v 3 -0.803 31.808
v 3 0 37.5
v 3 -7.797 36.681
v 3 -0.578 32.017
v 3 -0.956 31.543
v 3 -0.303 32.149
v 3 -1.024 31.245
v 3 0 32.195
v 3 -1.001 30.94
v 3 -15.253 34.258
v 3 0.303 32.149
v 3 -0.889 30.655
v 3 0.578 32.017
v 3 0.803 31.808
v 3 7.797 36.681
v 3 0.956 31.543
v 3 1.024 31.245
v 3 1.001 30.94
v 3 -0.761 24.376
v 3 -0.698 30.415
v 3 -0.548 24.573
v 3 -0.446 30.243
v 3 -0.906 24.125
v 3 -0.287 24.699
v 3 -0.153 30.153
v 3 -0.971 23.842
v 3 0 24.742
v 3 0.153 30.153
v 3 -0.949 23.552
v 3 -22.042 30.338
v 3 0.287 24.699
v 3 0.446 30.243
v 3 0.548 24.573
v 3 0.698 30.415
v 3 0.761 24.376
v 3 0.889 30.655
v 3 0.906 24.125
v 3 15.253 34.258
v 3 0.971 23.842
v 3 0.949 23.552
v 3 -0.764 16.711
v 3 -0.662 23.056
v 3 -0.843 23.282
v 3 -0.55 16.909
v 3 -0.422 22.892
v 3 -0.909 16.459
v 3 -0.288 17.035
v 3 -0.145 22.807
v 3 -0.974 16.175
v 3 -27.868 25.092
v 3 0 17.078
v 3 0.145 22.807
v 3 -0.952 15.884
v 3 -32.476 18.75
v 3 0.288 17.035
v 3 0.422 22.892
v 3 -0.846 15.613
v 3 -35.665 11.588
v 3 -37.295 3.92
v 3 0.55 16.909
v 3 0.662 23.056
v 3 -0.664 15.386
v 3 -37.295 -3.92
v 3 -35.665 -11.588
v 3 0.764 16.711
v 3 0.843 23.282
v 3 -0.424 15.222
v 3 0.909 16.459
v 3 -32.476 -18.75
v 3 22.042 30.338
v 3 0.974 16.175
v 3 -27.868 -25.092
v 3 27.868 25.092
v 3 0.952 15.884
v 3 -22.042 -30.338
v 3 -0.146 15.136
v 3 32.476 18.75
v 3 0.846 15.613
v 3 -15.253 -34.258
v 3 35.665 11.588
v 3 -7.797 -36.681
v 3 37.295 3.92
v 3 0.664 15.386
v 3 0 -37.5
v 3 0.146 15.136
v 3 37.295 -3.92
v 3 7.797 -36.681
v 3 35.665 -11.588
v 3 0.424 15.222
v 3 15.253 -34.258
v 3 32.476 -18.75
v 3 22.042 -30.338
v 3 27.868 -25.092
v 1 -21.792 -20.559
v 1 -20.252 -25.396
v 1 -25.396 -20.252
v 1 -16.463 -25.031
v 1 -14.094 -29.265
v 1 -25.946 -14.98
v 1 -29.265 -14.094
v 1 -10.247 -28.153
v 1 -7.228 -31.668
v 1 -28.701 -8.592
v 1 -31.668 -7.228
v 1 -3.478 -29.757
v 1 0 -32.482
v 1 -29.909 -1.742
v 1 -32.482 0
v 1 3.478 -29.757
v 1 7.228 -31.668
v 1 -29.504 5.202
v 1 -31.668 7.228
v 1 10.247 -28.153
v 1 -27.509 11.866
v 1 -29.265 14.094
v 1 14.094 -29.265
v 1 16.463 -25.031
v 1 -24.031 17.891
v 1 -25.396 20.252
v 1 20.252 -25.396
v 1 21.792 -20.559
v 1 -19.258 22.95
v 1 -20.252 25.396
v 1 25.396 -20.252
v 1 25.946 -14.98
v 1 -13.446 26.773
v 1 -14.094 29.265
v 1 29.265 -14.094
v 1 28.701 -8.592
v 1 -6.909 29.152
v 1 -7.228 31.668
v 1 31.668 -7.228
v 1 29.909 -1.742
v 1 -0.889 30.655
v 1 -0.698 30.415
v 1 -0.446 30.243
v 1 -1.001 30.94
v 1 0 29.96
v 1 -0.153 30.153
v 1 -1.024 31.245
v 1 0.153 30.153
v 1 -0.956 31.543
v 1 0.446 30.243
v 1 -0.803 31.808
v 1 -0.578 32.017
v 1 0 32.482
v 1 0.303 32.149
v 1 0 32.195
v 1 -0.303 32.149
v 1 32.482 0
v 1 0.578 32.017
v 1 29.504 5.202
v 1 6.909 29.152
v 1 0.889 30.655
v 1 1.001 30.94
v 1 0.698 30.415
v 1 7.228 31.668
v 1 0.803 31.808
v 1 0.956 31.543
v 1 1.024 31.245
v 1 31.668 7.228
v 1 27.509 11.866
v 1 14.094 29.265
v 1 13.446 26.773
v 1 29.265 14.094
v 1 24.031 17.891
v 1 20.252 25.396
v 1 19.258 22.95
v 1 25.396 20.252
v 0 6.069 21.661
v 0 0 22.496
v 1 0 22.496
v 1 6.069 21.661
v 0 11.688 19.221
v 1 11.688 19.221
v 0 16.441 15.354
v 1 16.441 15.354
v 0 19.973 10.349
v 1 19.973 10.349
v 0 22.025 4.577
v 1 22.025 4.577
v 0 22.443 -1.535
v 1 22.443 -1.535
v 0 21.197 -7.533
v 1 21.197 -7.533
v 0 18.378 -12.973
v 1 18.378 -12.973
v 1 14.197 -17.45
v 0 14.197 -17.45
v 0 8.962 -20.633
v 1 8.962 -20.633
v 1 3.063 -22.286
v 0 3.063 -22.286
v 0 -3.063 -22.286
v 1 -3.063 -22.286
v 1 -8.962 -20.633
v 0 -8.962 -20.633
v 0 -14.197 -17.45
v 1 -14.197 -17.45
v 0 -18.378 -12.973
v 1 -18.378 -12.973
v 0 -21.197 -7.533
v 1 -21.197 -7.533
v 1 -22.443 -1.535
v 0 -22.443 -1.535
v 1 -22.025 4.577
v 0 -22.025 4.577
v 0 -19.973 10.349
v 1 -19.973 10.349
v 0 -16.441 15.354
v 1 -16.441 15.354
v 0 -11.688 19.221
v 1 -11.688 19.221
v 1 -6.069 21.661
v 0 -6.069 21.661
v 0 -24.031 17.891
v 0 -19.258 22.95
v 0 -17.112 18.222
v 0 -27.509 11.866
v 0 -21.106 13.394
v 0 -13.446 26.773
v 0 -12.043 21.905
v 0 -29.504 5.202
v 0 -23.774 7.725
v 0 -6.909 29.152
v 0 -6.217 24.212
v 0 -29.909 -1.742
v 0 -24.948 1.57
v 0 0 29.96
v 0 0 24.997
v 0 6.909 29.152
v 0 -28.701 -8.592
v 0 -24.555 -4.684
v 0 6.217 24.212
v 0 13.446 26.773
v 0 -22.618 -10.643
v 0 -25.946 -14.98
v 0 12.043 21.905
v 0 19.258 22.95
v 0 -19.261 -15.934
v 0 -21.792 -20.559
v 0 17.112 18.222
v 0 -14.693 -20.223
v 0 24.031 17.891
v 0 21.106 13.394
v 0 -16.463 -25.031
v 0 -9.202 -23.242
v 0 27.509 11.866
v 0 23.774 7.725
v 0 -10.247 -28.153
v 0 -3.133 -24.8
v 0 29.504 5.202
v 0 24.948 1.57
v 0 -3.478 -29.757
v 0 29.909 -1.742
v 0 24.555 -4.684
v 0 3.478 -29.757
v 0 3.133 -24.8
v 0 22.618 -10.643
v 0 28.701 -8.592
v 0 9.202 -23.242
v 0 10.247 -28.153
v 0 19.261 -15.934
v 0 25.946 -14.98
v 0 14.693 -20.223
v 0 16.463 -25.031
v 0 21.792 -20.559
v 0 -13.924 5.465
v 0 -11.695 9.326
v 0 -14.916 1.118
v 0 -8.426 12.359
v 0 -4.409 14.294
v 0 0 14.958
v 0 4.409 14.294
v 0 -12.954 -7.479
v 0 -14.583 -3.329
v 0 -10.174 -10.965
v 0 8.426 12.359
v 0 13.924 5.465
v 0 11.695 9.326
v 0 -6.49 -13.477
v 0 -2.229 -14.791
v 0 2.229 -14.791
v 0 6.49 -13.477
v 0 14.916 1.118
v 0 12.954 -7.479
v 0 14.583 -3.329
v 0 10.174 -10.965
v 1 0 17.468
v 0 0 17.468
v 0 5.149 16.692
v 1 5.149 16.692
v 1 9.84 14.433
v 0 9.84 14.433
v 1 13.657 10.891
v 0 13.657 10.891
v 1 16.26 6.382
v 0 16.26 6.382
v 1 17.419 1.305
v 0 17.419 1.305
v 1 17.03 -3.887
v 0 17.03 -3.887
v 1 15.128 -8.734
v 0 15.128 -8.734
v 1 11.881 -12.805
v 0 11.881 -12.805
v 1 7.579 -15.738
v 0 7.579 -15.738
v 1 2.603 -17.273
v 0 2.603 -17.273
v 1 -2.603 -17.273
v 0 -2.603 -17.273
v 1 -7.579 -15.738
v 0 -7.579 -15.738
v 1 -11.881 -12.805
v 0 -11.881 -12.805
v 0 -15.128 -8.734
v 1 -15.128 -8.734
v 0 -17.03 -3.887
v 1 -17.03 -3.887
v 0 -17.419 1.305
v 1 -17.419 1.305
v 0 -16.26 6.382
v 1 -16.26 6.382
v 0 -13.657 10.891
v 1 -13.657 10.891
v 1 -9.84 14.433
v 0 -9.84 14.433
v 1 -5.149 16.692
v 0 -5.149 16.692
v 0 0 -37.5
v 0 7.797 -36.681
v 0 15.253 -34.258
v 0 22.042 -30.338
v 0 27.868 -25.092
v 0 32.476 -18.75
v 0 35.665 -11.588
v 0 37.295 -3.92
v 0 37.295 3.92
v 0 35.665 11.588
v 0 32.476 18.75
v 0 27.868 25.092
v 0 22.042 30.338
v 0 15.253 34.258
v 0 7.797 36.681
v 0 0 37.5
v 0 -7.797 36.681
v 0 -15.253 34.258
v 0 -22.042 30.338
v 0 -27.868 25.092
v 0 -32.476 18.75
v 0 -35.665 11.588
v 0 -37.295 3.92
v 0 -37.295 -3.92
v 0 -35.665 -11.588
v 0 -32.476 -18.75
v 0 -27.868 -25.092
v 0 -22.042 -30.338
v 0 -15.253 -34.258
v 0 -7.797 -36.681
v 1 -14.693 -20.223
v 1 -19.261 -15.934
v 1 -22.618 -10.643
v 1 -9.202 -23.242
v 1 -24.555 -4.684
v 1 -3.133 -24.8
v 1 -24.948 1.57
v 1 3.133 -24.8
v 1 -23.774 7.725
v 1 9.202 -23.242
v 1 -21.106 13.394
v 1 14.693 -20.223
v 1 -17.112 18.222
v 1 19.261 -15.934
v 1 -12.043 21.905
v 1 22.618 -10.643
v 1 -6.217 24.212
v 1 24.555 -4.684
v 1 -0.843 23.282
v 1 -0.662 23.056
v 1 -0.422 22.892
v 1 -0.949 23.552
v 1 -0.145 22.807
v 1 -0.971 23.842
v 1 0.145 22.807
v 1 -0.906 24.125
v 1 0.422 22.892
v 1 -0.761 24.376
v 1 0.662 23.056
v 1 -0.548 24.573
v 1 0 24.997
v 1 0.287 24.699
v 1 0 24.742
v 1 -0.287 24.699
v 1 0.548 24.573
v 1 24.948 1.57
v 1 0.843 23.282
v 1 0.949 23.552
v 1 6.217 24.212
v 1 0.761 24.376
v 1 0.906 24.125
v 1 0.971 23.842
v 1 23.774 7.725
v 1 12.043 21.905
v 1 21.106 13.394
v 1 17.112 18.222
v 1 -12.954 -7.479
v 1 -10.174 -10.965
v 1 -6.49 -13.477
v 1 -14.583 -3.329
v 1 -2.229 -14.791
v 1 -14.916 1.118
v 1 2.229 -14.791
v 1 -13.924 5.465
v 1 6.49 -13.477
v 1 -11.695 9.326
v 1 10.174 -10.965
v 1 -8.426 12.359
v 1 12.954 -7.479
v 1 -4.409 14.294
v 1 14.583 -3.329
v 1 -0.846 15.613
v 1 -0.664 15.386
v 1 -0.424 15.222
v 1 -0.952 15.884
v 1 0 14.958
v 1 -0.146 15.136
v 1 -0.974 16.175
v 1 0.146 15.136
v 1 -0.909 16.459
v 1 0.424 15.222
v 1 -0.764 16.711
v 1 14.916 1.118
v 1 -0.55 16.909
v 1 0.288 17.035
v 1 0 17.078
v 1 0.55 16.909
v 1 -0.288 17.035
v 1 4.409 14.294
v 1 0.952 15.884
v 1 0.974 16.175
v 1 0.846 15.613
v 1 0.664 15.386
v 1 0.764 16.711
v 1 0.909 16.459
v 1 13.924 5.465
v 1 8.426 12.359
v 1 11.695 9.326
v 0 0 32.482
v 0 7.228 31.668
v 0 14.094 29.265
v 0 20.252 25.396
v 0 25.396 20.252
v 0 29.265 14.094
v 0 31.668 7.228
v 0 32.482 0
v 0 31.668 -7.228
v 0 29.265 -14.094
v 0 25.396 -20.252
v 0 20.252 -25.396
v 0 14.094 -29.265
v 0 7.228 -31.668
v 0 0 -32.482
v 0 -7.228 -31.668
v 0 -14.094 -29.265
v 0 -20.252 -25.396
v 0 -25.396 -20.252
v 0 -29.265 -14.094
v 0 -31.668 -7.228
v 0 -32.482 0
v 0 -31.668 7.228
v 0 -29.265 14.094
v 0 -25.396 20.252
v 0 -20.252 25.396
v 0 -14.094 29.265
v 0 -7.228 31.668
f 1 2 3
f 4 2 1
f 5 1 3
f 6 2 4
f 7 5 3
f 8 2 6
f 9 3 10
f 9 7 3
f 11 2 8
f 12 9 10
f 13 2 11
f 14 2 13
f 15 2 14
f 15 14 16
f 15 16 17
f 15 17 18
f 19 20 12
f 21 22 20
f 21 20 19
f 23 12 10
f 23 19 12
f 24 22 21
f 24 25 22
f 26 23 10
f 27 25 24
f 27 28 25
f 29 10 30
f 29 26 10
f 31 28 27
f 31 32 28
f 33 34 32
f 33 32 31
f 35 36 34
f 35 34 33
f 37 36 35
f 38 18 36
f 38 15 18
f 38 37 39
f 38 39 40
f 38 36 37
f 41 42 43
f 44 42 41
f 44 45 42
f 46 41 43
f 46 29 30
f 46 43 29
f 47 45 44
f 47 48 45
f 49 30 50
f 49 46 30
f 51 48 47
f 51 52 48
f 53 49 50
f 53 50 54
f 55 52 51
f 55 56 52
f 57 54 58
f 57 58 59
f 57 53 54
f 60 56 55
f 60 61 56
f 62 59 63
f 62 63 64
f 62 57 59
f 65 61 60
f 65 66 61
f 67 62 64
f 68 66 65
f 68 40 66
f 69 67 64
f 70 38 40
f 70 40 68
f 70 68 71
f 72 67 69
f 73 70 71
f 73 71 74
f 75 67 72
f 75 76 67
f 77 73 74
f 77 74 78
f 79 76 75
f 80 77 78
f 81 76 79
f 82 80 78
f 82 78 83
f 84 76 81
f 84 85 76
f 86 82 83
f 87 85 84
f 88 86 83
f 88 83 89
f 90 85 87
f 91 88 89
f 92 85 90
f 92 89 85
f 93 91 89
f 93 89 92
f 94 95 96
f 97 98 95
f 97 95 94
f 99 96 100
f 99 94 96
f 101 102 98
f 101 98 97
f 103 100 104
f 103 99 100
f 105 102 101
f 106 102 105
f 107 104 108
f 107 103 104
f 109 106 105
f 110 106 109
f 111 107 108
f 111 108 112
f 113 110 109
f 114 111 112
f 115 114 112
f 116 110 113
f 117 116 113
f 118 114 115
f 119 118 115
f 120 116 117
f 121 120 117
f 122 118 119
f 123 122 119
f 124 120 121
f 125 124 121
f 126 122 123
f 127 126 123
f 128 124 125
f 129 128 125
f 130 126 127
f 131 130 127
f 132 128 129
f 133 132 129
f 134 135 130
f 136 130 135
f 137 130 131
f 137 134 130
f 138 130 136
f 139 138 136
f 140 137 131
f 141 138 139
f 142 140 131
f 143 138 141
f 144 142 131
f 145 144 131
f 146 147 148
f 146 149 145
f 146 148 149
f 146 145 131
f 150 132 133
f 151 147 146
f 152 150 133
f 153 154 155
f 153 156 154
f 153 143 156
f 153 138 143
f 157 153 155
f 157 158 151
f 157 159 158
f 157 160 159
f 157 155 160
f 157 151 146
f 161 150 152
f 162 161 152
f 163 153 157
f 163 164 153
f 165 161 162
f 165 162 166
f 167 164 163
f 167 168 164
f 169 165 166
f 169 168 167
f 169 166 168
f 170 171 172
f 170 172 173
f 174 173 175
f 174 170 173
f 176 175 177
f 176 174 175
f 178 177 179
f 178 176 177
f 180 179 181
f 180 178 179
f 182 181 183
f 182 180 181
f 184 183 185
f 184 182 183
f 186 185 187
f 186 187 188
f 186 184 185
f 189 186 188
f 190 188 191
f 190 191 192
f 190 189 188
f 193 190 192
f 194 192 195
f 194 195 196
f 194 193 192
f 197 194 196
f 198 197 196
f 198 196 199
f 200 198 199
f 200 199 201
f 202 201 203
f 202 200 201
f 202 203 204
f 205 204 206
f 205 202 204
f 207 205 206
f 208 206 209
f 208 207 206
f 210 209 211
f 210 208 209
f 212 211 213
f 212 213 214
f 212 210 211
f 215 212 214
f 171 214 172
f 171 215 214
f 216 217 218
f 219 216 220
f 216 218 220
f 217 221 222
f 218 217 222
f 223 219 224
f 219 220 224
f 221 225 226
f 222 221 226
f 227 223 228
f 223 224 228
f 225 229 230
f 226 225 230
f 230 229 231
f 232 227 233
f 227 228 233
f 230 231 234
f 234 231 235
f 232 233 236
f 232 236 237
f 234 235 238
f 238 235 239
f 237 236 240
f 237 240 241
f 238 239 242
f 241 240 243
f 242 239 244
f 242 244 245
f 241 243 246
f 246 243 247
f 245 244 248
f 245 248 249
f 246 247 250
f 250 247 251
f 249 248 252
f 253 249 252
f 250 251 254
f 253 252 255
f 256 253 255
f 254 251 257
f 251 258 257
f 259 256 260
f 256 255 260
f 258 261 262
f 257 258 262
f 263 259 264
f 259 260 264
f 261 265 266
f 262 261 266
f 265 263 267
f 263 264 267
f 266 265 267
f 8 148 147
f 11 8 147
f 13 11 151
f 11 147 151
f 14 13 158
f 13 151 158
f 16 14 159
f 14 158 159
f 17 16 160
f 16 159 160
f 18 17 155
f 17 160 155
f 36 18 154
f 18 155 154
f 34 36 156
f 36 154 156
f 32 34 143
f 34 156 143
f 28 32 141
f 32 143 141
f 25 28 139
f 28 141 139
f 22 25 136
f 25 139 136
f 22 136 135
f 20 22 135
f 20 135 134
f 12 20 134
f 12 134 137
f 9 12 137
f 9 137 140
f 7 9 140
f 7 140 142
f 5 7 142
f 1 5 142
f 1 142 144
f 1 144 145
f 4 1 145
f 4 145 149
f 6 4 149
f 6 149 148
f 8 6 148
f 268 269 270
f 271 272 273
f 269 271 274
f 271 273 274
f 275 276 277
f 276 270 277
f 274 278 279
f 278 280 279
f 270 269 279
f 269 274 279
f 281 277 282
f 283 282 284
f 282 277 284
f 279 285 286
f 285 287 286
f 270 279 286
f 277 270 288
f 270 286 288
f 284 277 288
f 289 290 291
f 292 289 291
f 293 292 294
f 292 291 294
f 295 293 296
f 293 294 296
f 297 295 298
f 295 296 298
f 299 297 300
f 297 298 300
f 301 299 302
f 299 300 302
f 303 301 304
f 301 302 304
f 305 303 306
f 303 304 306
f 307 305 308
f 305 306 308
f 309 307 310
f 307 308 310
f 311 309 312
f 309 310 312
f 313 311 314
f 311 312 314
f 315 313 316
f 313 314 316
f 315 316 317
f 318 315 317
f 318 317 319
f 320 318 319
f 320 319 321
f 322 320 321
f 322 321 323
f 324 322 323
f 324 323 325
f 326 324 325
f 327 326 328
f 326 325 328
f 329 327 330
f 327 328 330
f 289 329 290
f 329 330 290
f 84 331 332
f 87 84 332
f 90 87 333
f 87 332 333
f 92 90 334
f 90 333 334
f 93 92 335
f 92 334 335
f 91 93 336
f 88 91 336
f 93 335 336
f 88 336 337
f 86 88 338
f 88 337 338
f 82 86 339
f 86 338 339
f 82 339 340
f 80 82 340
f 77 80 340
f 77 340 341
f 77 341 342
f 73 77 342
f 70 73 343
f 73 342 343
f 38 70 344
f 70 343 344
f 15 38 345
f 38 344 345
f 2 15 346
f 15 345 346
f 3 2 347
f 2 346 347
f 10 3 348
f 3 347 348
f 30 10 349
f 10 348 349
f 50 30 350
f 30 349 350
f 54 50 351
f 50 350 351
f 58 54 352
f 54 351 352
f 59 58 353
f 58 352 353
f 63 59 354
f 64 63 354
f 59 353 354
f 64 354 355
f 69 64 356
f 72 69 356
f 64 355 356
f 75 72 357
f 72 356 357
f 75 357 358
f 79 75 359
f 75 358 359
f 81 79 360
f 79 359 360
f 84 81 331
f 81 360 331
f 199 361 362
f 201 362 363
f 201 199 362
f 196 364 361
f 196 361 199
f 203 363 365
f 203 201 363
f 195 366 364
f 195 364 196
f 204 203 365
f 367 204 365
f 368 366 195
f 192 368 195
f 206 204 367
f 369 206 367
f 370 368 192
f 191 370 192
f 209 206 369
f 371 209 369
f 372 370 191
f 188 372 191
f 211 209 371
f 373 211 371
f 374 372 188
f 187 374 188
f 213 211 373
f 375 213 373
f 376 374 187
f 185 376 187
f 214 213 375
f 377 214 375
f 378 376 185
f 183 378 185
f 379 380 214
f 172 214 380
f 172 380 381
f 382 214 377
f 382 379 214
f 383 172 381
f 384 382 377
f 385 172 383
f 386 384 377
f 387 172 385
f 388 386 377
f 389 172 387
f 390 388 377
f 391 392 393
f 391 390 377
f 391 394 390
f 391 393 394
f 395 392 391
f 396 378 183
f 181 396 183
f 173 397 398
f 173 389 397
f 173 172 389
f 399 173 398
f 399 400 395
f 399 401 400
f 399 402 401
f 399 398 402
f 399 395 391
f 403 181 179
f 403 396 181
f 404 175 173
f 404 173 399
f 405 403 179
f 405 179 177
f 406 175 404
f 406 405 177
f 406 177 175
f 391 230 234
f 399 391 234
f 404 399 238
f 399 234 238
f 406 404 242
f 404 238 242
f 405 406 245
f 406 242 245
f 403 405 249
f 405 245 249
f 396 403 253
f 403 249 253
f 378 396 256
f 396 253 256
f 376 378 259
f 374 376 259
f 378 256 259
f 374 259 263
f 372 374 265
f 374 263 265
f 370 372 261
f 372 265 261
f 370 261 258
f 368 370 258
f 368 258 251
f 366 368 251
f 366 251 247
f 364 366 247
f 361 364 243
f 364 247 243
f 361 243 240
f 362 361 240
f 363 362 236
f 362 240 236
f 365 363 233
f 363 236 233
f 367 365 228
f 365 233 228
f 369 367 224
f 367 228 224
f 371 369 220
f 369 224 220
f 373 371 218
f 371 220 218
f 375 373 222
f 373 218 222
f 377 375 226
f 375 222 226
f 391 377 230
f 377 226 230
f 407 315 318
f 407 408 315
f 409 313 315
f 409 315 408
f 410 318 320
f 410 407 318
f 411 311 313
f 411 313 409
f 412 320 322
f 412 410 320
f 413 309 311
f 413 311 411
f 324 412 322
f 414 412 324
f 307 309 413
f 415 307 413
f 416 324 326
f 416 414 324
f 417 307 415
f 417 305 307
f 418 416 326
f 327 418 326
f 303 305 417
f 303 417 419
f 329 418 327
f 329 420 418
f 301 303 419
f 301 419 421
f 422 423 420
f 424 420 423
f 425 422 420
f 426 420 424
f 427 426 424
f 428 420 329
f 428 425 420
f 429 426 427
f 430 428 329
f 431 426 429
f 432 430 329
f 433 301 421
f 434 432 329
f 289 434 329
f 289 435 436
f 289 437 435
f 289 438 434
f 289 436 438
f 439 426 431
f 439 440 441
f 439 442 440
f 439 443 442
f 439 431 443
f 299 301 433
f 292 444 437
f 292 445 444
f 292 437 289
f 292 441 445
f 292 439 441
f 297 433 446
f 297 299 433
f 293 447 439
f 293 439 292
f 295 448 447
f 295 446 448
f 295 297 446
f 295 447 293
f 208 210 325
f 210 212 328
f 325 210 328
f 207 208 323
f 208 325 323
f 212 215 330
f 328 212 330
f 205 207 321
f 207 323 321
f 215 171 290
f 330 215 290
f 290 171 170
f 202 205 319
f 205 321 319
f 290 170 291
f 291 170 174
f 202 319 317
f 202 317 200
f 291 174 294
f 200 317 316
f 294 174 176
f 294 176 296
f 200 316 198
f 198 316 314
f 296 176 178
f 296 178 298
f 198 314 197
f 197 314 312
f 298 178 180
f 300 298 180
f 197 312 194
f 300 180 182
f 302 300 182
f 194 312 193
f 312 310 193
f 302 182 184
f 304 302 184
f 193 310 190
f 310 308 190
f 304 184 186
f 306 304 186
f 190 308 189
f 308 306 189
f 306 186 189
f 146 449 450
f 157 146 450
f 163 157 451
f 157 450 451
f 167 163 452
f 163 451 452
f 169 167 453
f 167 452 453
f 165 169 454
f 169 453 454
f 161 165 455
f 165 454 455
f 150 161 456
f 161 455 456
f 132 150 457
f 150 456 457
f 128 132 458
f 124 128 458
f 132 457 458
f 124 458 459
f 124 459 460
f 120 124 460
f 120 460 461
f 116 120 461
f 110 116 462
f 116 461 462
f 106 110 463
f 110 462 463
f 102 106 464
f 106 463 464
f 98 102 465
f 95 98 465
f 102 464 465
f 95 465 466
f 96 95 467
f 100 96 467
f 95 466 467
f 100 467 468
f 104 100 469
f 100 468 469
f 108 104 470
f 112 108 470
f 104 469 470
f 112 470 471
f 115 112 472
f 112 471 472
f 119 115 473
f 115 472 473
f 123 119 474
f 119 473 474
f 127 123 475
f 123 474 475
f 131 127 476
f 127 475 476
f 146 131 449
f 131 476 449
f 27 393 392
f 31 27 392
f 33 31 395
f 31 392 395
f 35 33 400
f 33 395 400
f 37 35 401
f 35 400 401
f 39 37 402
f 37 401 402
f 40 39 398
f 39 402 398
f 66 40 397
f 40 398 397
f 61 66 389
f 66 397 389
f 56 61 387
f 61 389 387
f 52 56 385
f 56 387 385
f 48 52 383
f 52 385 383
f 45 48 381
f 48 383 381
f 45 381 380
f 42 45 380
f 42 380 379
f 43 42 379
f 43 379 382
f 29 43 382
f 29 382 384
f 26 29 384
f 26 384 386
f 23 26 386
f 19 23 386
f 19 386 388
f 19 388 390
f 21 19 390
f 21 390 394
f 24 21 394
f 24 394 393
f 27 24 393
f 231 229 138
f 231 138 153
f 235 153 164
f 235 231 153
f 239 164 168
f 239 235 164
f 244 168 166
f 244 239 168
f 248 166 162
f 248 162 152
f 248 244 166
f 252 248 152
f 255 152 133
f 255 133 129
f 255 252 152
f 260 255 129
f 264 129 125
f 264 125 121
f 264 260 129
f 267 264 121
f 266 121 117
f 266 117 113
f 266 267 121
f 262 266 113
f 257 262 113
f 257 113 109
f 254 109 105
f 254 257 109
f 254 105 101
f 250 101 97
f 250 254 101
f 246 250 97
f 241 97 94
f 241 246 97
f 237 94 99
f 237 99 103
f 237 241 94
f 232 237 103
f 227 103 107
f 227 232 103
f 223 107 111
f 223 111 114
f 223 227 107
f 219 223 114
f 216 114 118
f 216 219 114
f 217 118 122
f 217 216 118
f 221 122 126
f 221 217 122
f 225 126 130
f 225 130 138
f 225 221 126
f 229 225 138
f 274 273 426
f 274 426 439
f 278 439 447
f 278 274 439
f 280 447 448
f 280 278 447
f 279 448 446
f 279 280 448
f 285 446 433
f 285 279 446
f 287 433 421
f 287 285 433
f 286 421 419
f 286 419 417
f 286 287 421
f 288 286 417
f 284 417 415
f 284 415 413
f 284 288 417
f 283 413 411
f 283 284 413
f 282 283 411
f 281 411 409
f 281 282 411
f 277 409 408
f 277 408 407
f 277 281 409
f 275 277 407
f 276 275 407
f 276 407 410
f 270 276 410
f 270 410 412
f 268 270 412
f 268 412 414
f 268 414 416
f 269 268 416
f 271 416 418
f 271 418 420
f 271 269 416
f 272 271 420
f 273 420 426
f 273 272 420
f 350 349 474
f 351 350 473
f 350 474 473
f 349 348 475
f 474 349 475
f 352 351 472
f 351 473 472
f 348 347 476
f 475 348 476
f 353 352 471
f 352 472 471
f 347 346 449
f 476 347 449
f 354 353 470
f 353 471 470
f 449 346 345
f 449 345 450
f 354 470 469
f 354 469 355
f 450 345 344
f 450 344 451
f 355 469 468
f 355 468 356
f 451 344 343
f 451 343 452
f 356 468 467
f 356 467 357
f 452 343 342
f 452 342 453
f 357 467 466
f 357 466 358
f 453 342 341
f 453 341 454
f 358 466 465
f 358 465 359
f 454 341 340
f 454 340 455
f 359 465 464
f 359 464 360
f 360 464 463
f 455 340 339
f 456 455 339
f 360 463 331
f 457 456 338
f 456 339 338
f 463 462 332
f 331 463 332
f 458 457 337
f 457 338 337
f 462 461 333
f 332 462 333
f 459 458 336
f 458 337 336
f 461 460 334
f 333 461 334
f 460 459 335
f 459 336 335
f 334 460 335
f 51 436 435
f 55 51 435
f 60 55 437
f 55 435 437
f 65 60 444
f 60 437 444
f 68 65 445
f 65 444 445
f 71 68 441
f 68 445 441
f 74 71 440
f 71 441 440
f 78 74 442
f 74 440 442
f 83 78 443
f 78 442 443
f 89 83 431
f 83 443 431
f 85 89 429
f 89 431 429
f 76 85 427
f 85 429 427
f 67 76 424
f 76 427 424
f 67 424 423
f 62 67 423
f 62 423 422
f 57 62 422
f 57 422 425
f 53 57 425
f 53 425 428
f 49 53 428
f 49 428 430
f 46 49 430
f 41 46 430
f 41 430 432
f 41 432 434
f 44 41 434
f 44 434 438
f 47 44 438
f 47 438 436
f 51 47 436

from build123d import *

# Parameters (mm, degrees)
CROQUIS1_R              = 37.5
SALIENTE_EXTRUIR1_DEPTH = 3
CROQUIS2_R              = 32.482230575
CROQUIS2_R_2            = 29.959502021
CROQUIS2_R_3            = 24.997270629
CROQUIS2_R_4            = 22.495570161
CROQUIS2_R_5            = 17.467972247
CROQUIS2_R_6            = 14.95820612
CORTAR_EXTRUIR1_DEPTH   = 1
CROQUIS3_R              = 0.976738779
CROQUIS3_R_2            = 0.973277505
CROQUIS3_R_3            = 1.026895089
CORTAR_EXTRUIR2_DEPTH   = 3


with BuildPart() as part:
    # Croquis1 → Saliente-Extruir1 (new body)
    with BuildSketch(Plane(origin=(0, 0, 0), x_dir=(0, 0, -1), z_dir=(1, 0, 0))):
        Circle(CROQUIS1_R)
    extrude(amount=SALIENTE_EXTRUIR1_DEPTH)

    # Croquis2 → Cortar-Extruir1 (cut)
    # profile 1 of 3: a face of its own
    with BuildSketch(Plane.ZY):
        Circle(CROQUIS2_R)
        Circle(CROQUIS2_R_2, mode=Mode.SUBTRACT)
    # profile 2 of 3: a face of its own
    with BuildSketch(Plane.ZY):
        Circle(CROQUIS2_R_3)
        Circle(CROQUIS2_R_4, mode=Mode.SUBTRACT)
    # profile 3 of 3: a face of its own
    with BuildSketch(Plane.ZY):
        Circle(CROQUIS2_R_5)
        Circle(CROQUIS2_R_6, mode=Mode.SUBTRACT)
    extrude(amount=-CORTAR_EXTRUIR1_DEPTH, mode=Mode.SUBTRACT)

    # Croquis3 → Cortar-Extruir2 (cut)
    with BuildSketch(Plane.ZY):
        with Locations((16.101684192, 0)):
            Circle(CROQUIS3_R)
        with Locations((23.768998706, 0)):
            Circle(CROQUIS3_R_2)
        with Locations((31.1682253, 0)):
            Circle(CROQUIS3_R_3)
    extrude(amount=-CORTAR_EXTRUIR2_DEPTH, mode=Mode.SUBTRACT)


solid = part.part
